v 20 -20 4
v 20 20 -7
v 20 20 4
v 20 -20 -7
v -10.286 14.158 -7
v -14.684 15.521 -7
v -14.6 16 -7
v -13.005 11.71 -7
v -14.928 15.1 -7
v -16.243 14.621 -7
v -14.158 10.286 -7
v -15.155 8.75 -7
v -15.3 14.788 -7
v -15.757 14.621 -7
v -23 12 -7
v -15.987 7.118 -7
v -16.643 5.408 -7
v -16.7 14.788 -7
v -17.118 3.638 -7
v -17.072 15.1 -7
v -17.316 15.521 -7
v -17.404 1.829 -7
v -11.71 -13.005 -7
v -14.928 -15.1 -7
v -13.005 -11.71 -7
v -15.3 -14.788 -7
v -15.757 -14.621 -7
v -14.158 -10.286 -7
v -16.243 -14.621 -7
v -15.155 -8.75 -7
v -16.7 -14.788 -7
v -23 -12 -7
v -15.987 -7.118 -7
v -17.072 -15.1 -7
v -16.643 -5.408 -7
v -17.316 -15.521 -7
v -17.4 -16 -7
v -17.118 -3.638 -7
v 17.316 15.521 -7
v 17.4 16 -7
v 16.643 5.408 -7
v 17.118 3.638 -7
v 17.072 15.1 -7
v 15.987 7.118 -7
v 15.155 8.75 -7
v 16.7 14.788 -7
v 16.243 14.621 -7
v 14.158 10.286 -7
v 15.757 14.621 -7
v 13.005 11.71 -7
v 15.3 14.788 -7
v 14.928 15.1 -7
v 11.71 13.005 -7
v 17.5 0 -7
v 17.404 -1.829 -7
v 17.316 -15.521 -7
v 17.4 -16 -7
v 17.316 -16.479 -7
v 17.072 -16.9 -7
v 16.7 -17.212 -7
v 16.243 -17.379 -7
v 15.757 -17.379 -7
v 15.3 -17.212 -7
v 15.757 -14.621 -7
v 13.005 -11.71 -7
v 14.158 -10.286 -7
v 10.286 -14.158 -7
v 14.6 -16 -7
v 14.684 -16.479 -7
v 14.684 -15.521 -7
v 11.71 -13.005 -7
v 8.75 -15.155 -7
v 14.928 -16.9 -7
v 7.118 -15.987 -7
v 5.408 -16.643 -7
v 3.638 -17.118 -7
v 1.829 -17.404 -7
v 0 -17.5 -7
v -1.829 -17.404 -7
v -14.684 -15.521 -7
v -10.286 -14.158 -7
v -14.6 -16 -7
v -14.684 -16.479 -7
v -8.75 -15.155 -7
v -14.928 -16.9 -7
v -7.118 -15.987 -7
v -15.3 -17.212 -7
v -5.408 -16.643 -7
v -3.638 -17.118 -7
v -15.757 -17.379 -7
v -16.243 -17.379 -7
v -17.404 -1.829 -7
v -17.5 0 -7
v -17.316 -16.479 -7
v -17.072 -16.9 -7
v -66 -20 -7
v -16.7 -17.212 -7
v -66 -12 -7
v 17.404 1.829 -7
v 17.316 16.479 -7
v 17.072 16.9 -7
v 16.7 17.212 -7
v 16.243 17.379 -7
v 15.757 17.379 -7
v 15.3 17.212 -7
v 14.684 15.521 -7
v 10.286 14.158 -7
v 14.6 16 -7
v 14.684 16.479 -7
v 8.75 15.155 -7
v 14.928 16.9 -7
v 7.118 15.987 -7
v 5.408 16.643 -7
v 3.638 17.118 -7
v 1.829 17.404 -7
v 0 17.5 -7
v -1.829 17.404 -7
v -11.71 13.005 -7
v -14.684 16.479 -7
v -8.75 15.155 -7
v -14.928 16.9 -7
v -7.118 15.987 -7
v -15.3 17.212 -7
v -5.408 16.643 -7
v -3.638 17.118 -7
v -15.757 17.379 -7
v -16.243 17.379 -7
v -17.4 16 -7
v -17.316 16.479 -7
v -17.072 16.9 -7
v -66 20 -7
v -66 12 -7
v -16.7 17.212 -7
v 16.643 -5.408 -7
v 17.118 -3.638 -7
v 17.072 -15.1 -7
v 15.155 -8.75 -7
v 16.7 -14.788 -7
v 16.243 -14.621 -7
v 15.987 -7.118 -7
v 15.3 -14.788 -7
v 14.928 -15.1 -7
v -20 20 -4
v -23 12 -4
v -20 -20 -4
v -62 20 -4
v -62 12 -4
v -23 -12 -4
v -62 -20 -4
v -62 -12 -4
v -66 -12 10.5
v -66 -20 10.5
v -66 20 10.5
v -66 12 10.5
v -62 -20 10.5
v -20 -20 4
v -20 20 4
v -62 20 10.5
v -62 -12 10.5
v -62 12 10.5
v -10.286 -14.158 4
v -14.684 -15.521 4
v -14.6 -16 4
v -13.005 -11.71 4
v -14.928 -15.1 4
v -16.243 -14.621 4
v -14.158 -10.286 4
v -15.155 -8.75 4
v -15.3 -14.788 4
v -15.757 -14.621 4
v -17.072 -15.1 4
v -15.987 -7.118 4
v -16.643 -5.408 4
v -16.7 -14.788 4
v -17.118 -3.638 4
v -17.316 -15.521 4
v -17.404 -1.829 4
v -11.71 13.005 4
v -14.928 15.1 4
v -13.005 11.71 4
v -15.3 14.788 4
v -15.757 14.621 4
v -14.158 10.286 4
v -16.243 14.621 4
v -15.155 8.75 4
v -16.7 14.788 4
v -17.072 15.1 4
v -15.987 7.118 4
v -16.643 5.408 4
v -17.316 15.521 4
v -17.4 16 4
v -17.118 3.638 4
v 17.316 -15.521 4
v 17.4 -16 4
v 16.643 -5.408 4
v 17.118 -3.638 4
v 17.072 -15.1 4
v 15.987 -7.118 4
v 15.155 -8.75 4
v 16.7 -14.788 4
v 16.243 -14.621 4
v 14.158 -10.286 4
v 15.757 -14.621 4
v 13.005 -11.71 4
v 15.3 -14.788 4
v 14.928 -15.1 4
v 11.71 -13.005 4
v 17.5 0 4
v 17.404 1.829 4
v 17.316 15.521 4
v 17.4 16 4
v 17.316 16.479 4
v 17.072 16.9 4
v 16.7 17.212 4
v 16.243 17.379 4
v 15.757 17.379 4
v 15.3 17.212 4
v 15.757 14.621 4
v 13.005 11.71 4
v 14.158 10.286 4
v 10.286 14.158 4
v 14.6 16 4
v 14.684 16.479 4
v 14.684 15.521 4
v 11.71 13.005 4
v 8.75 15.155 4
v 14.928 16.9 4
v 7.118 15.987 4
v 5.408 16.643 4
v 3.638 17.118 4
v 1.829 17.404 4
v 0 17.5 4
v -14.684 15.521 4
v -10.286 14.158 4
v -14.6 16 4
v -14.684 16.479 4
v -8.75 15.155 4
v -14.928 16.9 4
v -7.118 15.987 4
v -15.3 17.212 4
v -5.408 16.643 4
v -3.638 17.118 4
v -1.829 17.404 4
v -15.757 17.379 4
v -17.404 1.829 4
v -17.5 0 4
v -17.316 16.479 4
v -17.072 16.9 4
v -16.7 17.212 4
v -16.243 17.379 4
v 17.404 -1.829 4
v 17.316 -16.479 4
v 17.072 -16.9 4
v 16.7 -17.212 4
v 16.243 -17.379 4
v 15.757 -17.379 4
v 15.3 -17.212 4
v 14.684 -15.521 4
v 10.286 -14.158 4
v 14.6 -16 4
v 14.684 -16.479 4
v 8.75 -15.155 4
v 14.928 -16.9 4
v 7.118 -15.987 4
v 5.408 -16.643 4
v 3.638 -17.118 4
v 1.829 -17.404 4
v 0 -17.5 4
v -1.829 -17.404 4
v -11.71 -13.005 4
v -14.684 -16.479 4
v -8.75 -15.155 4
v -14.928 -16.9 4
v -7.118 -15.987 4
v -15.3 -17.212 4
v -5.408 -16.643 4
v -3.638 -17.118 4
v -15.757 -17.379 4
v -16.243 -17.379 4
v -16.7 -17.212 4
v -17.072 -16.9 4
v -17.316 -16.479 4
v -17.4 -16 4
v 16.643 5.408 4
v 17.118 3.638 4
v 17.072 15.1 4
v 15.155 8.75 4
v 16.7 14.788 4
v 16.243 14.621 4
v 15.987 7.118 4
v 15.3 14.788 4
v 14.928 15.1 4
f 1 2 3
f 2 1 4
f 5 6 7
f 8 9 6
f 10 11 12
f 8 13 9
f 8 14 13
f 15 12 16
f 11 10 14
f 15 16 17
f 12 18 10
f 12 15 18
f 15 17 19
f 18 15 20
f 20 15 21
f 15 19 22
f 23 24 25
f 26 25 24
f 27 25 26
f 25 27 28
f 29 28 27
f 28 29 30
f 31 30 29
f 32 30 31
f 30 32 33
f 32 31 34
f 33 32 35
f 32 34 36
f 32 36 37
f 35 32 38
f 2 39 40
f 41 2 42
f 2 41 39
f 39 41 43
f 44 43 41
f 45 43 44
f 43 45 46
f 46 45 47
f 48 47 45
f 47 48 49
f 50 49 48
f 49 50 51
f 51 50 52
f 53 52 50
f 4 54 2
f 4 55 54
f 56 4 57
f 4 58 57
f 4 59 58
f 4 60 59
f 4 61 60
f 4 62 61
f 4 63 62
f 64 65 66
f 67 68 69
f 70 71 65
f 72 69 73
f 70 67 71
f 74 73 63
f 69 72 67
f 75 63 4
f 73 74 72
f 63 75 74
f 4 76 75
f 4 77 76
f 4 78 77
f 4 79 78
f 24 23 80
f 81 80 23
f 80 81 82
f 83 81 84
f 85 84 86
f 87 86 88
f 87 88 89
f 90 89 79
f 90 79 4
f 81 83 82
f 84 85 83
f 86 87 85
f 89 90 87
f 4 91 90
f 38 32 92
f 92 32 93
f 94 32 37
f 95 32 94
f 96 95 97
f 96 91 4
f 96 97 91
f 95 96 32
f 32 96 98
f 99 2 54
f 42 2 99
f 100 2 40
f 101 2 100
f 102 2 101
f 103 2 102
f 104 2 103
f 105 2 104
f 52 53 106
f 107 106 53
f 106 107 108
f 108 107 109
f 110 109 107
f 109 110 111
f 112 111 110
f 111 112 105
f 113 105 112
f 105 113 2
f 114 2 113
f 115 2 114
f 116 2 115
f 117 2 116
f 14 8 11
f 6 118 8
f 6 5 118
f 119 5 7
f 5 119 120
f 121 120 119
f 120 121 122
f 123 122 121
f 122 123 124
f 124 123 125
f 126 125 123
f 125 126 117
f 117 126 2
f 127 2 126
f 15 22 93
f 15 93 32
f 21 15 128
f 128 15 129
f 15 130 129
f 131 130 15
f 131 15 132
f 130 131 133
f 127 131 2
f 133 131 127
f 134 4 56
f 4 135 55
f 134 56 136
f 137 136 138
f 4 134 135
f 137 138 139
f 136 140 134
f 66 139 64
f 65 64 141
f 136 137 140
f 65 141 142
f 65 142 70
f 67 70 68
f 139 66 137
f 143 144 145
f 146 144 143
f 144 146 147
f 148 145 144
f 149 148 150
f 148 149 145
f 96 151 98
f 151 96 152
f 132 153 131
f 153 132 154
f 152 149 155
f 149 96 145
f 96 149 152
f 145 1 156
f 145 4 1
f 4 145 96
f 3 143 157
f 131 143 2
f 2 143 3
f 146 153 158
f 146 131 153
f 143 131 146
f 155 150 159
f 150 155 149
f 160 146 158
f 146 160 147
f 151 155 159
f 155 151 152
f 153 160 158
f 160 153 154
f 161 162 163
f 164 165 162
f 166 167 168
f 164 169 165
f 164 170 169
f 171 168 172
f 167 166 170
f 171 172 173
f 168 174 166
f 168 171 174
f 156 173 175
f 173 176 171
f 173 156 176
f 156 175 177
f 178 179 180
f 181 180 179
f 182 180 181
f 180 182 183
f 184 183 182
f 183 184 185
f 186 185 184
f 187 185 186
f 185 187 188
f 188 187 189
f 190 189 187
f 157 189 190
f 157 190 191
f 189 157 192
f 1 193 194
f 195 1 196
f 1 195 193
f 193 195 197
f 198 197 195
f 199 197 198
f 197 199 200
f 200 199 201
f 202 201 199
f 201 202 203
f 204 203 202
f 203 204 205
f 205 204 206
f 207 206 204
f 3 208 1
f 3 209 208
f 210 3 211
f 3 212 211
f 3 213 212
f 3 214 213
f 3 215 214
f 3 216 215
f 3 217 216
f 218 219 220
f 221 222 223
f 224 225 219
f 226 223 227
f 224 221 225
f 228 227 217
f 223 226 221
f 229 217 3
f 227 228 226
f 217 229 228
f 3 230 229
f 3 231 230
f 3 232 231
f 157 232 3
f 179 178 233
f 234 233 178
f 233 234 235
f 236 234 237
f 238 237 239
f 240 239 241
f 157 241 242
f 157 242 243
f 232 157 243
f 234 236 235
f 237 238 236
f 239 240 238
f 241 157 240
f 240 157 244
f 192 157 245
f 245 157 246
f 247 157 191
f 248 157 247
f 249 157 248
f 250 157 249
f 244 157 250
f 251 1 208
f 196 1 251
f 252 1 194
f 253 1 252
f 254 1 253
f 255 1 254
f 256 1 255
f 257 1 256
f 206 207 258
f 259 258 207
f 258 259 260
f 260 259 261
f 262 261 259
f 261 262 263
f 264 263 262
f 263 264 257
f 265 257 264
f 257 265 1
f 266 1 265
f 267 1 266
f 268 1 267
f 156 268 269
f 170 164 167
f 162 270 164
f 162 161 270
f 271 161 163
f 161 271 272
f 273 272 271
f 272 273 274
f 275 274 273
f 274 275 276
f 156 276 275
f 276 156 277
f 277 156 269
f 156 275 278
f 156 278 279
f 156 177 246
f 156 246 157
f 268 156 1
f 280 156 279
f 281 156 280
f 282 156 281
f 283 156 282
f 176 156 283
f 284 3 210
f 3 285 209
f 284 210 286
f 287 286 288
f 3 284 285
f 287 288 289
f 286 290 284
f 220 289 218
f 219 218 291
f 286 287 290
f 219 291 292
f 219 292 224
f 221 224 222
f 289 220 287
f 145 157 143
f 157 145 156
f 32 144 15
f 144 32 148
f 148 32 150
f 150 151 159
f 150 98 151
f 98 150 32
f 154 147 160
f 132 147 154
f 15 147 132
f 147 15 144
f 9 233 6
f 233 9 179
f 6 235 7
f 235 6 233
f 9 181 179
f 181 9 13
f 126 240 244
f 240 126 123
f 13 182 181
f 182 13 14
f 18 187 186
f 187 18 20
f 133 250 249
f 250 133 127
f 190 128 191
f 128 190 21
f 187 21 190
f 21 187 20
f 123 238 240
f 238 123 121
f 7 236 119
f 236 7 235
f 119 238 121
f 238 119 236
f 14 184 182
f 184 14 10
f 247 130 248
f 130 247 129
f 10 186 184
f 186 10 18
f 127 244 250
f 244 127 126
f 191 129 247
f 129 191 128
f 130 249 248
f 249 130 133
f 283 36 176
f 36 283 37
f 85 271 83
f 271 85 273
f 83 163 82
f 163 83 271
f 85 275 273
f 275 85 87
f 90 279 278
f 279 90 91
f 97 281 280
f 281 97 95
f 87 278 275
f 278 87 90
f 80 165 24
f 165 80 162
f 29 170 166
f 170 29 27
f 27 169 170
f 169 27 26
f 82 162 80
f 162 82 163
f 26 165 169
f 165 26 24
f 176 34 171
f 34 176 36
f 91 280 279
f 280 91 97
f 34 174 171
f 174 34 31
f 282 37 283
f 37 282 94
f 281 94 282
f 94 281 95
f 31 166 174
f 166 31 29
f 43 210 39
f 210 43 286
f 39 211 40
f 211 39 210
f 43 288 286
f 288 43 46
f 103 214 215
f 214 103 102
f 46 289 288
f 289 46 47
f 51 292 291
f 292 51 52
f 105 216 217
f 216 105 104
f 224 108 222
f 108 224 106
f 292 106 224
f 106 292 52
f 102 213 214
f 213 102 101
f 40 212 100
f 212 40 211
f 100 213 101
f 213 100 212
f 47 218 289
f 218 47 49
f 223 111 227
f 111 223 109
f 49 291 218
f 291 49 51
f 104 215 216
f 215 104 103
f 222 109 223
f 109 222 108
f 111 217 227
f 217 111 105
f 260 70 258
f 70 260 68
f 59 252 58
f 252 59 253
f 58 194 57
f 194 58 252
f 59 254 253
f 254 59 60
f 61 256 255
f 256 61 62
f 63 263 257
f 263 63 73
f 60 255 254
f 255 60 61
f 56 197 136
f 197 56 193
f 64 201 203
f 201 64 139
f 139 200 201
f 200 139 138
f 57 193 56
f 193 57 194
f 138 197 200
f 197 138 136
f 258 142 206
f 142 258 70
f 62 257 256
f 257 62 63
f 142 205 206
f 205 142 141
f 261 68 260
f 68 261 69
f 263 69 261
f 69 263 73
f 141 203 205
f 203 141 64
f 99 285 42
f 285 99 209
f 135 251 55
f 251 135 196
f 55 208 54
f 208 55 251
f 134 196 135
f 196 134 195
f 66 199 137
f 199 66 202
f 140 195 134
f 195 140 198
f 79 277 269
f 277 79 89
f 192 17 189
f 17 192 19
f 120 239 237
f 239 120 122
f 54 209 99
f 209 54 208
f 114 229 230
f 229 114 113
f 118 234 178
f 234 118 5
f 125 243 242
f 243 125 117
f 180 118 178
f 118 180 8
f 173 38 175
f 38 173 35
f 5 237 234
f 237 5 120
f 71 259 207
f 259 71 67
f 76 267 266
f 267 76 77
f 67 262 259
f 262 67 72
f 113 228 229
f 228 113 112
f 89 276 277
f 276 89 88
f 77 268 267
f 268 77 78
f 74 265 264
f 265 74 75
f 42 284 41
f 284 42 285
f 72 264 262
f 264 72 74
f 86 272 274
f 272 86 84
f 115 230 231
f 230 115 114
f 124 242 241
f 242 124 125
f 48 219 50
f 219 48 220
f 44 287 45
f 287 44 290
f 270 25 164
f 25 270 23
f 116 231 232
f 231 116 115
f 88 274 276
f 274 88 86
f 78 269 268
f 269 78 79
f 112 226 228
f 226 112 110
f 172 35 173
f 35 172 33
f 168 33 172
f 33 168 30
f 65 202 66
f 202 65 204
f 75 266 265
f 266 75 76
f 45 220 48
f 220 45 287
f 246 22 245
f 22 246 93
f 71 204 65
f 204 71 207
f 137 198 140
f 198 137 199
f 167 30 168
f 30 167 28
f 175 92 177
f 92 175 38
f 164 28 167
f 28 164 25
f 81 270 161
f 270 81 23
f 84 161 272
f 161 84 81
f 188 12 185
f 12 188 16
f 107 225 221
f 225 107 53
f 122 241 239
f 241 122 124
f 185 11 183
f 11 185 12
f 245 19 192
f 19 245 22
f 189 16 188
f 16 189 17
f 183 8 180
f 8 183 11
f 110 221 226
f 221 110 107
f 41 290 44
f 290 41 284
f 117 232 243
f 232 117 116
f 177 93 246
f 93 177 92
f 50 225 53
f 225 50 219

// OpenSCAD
// file: rubik_cube.scad
$fa=6;
$fs=0.5;

size = 18.7;
offset = (size-0.1-4)/2;

module center(){
    hull(){
        translate([offset,offset,0]) cylinder(0.2, d=4, center=true);
        translate([offset,-offset,0]) cylinder(0.2, d=4, center=true);
        translate([-offset,offset,0]) cylinder(0.2, d=4, center=true);
        translate([-offset,-offset,0]) cylinder(0.2, d=4, center=true);
    }
}

module edge(){
    hull(){
        translate([offset,offset,0]) cube([4,4,0.2], center=true);
        translate([offset,-offset,0]) cube([4,4,0.2], center=true);
        translate([-offset,offset,0]) cylinder(0.2, d=4, center=true);
        translate([-offset,-offset,0]) cylinder(0.2, d=4, center=true);
    }
}

module corner(){
    hull(){
        translate([offset,offset,0]) cube([4,4,0.2], center=true);
        translate([offset,-offset,0]) cube([4,4,0.2], center=true);
        translate([-offset,offset,0]) cube([4,4,0.2], center=true);
        translate([-offset,-offset,0]) cylinder(0.2, d=4, center=true);
    }
}

module face(){
    center();
    for(i=[0,90,180,270]){
        rotate([0,0,i]) translate([size, 0, 0]) edge();
        rotate([0,0,i]) translate([size, size, 0]) corner();
    }
}

module rubik_cube(){
    color("white") cube(56,center=true);
    translate([0,0,3*size/2]) color("yellow") face();
    translate([0,0,-3*size/2]) color("white") face();
    rotate([90,0,0]){
        translate([0,0,3*size/2]) color("blue") face();
        translate([0,0,-3*size/2]) color("green") face();
    }
    rotate([0,90,0]){
        translate([0,0,3*size/2]) color("red") face();
        translate([0,0,-3*size/2]) color("orange") face();
    }
}
rubik_cube();
// file: stepper.scad
$fa=6;
$fs=0.5;



stepper42();
translate([0,0,23]) rotate([180,0,0]) flange();
module flange(){
    difference(){
        union(){
            cylinder(h=2,d=22);
            cylinder(h=12,d=10);
        }
        cylinder(h=99,d=5,center=true);
        translate([8,0,0]) cylinder(h=99,d=3,center=true);
        translate([-8,0,0]) cylinder(h=99,d=3,center=true);
        translate([0,-8,0]) cylinder(h=99,d=3,center=true);
        translate([0,8,0]) cylinder(h=99,d=3,center=true);
    }
}


module stepper42(){
    union(){
        top();
        translate([0,0,-8]) mid();
        translate([0,0,-8-9.5-23-8]) mirror([0,0,1]) bot();
    }
}


module mid(){
    mid_r = 8;
    offset_xy = 42/2 - mid_r;
    length = 23+8; // 硅钢片高度
    hull(){
        translate([offset_xy, offset_xy, -length]) cylinder(h=length, r=mid_r, $fn=4);
        translate([offset_xy, -offset_xy, -length]) cylinder(h=length, r=mid_r, $fn=4);
        translate([-offset_xy, offset_xy, -length]) cylinder(h=length, r=mid_r, $fn=4);
        translate([-offset_xy, -offset_xy, -length]) cylinder(h=length, r=mid_r, $fn=4);
    }
}
module top(){
    top_r = 4;
    offset_xy = 42/2 - top_r;
    length = 23+2; // 电机轴长度
    union(){
        difference(){
            hull(){
                translate([offset_xy, offset_xy, -8]) cylinder(h=8, r=top_r, $fn=4);
                translate([offset_xy, -offset_xy, -8]) cylinder(h=8, r=top_r, $fn=4);
                translate([-offset_xy, offset_xy, -8]) cylinder(h=8, r=top_r, $fn=4);
                translate([-offset_xy, -offset_xy, -8]) cylinder(h=8, r=top_r, $fn=4);
            }
            translate([31/2, 31/2, 0]) cylinder(h=20,d=2.5,center=true); 
            translate([-31/2, 31/2, 0]) cylinder(h=20,d=2.5,center=true);
            translate([31/2, -31/2, 0]) cylinder(h=20,d=2.5,center=true);
            translate([-31/2, -31/2, 0]) cylinder(h=20,d=2.5,center=true);       
        }
        difference(){
            cylinder(h=2,d=22);
            cylinder(h=20,d=9,center=true);
        }
        difference(){
             cylinder(h=length,d=5);
             translate([-5/2, 4.5/2, 0]) cube([5,5,length]);
        }
    }
}
module bot()
{
    bot_r = 4;
    offset_xy = 42/2 - bot_r;
    union(){
        difference(){
            hull(){
                translate([offset_xy, offset_xy, -9.5]) cylinder(h=9.5, r=bot_r, $fn=4);
                translate([offset_xy, -offset_xy, -9.5]) cylinder(h=9.5, r=bot_r, $fn=4);
                translate([-offset_xy, offset_xy, -9.5]) cylinder(h=9.5, r=bot_r, $fn=4);
                translate([-offset_xy, -offset_xy, -9.5]) cylinder(h=9.5, r=bot_r, $fn=4);
            }
            translate([31/2, 31/2, 0]) cylinder(h=20,d=3.5,center=true); 
            translate([-31/2, 31/2, 0]) cylinder(h=20,d=3.5,center=true);
            translate([31/2, -31/2, 0]) cylinder(h=20,d=3.5,center=true);
            translate([-31/2, -31/2, 0]) cylinder(h=20,d=3.5,center=true);
            translate([31/2, 31/2, -2.5]) cylinder(h=20,d=6); 
            translate([-31/2, 31/2, -2.5]) cylinder(h=20,d=6);
            translate([31/2, -31/2, -2.5]) cylinder(h=20,d=6);
            translate([-31/2, -31/2, -2.5]) cylinder(h=20,d=6);
            translate([0, 0, -3.5]) cylinder(h=20,d=9);
        }
        translate([-16/2,42/2,-9.5])cube([16,6,9.5]);
    }
}
// main file
$fa=6;
$fs=0.5;
use <main.scad>



// 以下分别打印1个
//base_board();
//cube_spin();
rotate([180,0,0]) fan_holder();

// 以下分别打印2个
//claw_3d_print();
//stepper_shelf();

// 以下分别打印4个
//spring();


// 垫柱，打印不同尺寸的备用
/*
for(i=[0:7]){
    translate([10*0,i*10,0])cyl(2);
    translate([10*1,i*10,0])cyl(3);
    translate([10*2,i*10,0])cyl(4);
    translate([10*3,i*10,0])cyl(5);
}
*/
